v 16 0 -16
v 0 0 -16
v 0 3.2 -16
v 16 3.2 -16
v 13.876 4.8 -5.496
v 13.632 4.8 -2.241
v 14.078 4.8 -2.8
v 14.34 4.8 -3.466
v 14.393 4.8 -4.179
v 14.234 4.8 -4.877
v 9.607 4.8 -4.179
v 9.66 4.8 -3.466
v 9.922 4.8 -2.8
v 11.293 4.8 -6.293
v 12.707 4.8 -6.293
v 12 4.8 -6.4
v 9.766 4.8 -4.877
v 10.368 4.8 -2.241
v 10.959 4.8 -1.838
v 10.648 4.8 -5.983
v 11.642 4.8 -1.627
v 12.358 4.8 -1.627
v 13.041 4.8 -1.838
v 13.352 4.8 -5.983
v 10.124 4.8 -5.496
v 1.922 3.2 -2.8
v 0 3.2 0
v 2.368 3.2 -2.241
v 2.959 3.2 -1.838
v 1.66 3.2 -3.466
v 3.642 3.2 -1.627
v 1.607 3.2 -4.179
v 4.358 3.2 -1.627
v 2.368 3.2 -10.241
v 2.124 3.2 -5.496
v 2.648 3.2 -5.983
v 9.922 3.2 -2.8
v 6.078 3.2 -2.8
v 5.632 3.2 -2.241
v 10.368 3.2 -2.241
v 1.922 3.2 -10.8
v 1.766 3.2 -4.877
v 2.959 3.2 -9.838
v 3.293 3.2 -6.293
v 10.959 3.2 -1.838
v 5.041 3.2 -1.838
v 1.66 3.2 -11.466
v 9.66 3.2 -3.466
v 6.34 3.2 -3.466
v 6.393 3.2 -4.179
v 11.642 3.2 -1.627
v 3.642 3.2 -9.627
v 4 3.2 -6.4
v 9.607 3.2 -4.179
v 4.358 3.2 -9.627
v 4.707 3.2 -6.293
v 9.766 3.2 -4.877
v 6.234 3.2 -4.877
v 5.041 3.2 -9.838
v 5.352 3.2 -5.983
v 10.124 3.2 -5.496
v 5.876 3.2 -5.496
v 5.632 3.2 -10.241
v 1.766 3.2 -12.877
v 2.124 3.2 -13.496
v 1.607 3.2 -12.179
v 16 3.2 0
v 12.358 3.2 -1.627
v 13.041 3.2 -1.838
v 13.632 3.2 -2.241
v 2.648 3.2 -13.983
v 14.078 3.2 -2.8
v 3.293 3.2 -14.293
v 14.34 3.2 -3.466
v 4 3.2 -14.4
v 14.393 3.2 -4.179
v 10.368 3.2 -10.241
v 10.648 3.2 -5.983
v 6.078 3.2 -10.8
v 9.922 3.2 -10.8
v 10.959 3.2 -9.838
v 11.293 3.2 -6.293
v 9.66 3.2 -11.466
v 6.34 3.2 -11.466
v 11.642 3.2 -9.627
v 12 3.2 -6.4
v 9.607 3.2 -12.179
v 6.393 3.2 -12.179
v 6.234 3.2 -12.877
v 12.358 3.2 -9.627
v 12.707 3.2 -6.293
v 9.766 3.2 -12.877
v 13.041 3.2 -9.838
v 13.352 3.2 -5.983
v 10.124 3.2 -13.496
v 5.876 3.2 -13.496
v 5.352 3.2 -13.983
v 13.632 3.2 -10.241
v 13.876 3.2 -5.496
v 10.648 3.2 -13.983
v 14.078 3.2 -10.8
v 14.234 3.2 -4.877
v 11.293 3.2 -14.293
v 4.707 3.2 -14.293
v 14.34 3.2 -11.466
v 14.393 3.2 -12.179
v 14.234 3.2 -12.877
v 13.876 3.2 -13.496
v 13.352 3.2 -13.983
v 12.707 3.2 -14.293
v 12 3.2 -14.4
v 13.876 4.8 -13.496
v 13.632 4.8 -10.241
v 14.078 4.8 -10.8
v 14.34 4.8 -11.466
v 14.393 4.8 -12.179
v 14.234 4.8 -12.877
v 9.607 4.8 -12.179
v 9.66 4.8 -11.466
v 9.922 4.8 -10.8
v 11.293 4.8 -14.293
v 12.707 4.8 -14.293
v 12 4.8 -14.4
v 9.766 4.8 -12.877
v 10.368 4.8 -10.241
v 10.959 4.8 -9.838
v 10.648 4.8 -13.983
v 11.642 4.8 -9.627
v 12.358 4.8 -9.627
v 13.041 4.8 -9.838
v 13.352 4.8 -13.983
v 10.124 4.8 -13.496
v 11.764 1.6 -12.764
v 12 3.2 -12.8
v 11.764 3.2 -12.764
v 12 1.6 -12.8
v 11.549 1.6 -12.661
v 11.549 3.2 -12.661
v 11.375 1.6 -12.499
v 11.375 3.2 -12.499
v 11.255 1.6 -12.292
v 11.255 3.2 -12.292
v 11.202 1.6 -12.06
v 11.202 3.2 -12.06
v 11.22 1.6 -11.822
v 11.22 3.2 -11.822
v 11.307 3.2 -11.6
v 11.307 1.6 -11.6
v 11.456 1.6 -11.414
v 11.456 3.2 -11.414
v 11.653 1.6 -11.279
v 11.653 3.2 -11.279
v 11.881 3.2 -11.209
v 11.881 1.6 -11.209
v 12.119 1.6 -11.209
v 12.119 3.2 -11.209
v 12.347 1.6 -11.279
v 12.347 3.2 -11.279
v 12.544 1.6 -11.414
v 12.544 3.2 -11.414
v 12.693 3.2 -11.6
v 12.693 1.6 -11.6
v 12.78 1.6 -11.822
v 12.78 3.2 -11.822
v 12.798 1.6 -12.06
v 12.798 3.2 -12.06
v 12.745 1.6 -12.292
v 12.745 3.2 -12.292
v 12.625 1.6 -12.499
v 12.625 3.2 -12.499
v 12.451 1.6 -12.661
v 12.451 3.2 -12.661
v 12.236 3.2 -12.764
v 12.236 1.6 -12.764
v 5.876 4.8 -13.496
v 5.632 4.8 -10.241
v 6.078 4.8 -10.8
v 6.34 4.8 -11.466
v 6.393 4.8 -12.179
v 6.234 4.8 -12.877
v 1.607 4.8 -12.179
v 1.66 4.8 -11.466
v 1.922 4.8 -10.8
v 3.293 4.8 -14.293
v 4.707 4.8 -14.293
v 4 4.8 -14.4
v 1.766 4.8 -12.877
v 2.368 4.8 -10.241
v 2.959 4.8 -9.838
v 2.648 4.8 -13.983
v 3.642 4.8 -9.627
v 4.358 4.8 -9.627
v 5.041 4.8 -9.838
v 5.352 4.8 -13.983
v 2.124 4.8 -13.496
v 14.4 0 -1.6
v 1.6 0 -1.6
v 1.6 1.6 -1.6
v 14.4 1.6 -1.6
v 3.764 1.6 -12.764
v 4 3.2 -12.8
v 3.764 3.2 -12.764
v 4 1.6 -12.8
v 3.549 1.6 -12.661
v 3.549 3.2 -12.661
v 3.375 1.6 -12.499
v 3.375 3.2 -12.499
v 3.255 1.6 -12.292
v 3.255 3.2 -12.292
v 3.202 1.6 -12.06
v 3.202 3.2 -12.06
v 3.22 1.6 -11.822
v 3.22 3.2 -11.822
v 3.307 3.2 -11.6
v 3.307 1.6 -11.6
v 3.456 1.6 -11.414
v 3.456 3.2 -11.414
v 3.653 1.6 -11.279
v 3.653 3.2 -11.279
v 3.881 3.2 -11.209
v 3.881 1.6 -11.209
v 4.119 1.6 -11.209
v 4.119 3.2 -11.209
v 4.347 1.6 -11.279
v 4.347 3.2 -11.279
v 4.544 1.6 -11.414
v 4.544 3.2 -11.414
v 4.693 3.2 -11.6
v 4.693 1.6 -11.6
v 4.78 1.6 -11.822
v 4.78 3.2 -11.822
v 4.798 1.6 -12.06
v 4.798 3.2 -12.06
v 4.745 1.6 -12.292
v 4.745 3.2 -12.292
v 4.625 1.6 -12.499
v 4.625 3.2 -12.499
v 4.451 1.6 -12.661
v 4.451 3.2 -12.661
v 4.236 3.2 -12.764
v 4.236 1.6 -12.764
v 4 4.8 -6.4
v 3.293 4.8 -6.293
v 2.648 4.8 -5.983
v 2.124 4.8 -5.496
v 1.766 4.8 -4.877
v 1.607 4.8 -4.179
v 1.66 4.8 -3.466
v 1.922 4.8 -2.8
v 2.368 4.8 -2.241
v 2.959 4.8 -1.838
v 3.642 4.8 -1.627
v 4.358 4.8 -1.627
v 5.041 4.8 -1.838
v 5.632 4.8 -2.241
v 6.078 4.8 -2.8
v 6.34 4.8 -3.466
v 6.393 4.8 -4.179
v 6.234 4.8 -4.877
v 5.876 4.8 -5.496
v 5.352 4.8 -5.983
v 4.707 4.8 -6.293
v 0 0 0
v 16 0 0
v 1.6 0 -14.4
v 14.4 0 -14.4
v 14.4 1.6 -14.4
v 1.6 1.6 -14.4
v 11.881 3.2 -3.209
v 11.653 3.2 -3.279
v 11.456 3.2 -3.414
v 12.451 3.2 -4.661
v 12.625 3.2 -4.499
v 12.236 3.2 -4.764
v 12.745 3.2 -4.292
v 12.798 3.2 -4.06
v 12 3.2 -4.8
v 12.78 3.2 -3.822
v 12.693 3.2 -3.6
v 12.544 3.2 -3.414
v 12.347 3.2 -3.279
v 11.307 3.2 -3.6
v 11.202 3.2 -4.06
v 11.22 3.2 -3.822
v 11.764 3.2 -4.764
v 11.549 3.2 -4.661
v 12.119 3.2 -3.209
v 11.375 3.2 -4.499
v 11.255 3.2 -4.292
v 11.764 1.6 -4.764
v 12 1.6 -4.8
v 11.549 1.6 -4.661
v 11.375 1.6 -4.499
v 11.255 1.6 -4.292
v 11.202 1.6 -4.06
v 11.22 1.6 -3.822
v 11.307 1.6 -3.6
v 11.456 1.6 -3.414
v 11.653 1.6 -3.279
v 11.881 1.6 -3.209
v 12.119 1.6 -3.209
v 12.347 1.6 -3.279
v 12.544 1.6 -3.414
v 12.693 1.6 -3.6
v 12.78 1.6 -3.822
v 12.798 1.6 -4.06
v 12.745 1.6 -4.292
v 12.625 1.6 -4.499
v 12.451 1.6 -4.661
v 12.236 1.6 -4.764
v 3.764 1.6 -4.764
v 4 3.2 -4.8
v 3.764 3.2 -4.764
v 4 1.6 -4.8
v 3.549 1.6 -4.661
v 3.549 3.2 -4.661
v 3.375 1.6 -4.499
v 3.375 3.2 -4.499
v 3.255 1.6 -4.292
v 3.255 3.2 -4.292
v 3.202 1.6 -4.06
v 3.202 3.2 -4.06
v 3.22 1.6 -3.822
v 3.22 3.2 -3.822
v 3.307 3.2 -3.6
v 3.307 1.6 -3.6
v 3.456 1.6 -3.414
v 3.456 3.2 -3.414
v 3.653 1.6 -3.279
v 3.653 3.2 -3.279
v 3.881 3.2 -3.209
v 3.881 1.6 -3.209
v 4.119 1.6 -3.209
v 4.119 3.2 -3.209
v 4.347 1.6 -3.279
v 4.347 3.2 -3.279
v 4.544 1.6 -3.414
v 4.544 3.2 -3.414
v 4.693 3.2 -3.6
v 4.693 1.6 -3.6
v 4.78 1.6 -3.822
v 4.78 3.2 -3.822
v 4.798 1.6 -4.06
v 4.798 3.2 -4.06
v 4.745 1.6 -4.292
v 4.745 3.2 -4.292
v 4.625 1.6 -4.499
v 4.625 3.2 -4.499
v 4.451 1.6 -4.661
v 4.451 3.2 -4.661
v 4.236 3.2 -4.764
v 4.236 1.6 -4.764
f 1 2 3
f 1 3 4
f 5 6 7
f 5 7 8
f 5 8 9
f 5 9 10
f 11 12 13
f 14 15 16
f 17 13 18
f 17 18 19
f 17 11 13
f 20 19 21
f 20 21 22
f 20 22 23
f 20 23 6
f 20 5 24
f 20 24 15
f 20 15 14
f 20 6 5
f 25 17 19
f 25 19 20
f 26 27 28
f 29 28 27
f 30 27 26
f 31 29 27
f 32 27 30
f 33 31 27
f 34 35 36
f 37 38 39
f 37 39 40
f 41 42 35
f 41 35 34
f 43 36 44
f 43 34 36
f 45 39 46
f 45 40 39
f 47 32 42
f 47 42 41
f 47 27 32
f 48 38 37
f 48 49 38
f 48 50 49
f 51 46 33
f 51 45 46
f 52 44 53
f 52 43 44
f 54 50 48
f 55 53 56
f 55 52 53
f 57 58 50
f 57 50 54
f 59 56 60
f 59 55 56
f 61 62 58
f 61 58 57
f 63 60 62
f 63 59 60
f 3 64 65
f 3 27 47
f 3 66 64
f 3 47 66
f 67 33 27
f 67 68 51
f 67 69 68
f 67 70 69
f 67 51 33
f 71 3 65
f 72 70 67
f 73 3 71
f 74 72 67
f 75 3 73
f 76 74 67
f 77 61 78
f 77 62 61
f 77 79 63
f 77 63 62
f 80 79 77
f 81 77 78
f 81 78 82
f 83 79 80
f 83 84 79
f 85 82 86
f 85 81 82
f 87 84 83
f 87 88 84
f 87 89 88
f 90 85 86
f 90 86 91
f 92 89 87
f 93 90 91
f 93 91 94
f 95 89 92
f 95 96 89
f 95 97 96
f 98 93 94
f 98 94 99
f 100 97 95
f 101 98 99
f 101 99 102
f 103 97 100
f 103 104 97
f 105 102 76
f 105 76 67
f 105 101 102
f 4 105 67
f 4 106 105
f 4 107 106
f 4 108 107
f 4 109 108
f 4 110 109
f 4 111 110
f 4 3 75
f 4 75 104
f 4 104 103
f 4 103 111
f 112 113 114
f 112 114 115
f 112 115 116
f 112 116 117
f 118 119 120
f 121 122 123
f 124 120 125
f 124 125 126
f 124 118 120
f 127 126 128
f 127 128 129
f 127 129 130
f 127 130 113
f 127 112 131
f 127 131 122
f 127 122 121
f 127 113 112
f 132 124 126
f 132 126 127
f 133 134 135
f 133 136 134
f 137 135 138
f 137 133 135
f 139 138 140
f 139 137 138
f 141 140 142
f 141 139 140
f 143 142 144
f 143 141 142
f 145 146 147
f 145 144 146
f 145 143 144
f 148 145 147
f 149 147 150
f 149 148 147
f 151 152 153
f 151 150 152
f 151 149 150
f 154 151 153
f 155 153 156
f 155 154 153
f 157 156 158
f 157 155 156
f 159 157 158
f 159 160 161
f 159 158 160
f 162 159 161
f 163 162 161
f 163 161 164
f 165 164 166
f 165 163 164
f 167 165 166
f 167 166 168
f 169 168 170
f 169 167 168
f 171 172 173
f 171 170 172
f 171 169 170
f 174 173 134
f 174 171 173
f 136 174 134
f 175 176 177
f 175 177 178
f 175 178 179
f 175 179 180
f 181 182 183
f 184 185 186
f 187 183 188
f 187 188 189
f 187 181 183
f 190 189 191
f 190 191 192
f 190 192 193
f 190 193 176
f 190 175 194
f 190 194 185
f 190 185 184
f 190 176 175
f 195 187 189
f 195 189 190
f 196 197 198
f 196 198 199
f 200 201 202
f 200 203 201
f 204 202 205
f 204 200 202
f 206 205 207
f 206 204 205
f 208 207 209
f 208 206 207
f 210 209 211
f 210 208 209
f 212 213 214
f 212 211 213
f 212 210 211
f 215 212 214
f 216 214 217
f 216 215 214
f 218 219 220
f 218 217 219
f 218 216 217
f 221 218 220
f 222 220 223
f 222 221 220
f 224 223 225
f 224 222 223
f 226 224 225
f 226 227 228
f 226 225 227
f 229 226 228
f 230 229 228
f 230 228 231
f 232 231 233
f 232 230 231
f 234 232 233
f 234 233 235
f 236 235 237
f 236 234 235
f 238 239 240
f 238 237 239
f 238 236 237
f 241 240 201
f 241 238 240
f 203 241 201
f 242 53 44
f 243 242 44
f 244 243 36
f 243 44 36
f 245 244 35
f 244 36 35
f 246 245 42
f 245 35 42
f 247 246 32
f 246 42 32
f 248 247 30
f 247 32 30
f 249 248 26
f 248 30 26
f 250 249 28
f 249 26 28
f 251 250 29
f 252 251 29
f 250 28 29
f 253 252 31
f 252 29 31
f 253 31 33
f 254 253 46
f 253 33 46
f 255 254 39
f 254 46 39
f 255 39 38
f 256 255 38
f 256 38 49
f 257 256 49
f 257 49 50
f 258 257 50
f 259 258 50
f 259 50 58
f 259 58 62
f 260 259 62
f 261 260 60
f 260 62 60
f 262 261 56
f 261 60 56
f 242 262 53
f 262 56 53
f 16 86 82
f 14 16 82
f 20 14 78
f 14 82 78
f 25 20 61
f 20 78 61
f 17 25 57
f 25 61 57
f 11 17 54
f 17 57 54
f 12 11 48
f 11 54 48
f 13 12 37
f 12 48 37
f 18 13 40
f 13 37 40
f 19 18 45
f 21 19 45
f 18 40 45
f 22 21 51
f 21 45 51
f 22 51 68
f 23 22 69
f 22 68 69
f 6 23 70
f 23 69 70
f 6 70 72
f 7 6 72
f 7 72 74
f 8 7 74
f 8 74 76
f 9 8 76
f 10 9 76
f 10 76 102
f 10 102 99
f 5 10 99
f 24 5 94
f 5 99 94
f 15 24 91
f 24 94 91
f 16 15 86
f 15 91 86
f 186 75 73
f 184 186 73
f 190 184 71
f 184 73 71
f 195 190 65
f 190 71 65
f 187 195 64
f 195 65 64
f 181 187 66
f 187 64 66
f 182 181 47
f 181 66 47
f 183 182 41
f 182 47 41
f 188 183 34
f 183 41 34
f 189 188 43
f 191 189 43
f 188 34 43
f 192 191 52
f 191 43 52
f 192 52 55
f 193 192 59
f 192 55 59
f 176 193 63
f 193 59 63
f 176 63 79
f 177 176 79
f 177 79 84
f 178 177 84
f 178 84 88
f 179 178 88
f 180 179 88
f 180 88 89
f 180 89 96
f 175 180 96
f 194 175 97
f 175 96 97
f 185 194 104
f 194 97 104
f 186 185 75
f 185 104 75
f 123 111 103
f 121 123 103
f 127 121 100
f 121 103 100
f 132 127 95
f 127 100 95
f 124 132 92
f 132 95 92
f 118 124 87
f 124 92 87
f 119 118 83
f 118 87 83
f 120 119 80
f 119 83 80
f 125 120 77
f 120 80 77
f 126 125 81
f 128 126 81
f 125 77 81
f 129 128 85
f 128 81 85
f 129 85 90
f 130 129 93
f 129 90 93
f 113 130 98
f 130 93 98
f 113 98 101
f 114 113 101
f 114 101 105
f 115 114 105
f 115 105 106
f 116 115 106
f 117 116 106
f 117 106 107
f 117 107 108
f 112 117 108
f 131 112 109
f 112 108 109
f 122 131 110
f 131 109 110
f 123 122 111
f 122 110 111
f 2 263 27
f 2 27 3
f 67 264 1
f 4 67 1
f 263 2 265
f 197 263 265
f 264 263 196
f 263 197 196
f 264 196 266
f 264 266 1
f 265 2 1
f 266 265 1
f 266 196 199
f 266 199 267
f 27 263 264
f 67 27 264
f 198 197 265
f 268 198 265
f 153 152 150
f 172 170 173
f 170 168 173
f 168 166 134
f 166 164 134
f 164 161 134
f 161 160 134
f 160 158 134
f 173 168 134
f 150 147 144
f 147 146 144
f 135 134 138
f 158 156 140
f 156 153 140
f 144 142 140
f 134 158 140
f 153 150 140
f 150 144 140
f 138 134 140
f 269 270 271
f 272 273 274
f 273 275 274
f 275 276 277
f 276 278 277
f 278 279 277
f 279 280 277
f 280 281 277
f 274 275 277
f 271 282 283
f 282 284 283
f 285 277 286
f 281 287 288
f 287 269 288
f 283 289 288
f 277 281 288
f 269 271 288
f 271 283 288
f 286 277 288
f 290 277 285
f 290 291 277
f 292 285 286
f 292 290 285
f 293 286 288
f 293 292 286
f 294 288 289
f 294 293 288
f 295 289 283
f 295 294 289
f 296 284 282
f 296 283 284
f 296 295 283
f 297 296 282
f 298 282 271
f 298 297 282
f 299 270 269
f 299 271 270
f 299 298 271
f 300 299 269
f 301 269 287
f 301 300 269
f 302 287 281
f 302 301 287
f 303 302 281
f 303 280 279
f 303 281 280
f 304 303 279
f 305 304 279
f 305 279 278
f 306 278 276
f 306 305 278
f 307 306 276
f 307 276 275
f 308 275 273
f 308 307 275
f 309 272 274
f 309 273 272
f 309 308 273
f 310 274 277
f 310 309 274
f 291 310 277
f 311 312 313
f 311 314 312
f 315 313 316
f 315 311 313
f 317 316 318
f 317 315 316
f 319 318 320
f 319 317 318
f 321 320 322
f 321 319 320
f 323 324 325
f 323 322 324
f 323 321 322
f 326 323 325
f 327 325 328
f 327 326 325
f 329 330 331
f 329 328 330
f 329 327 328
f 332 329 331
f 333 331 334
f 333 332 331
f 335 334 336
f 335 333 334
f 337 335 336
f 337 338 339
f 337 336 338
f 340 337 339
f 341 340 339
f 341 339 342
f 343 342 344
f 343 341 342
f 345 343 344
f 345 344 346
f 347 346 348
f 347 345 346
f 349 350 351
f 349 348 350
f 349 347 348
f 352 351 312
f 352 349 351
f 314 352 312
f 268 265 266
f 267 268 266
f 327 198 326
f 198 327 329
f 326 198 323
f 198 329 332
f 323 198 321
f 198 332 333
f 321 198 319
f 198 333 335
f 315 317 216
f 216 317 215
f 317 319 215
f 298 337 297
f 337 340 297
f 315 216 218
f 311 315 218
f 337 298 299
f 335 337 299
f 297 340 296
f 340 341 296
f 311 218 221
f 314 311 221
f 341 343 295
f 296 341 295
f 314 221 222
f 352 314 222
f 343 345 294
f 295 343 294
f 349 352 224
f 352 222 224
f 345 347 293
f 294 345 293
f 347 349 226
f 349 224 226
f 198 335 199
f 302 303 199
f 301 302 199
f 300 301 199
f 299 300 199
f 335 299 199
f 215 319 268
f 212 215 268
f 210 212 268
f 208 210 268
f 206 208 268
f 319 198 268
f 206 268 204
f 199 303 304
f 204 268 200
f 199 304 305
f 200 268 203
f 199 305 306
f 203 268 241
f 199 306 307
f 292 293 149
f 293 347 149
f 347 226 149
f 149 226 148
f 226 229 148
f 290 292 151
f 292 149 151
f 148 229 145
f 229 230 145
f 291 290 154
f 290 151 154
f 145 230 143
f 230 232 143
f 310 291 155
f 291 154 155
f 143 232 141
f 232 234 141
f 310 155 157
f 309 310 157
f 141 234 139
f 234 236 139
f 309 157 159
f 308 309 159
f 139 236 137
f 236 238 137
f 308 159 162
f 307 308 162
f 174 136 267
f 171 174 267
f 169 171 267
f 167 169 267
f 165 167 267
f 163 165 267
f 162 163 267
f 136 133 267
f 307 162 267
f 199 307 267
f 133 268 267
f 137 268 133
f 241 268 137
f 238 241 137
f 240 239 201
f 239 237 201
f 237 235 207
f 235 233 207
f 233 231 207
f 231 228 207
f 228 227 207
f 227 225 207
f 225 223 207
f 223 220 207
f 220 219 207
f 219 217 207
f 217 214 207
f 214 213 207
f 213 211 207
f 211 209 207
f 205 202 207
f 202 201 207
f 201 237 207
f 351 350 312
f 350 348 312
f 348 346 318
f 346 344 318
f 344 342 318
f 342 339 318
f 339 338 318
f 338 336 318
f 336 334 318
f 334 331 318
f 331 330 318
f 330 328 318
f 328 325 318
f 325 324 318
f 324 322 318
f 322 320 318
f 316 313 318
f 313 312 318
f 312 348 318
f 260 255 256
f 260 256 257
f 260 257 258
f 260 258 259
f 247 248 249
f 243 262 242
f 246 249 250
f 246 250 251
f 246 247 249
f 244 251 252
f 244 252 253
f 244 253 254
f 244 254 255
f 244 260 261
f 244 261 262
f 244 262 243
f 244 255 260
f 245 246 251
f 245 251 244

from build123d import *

# Parameters (mm, degrees)
SKETCH1_W            = 16
SKETCH1_H            = 16
BOSS_EXTRUDE1_DEPTH  = 3.2
SKETCH2_R            = 2.4
BOSS_EXTRUDE2_DEPTH  = 1.6
LPATTERN1_COUNT      = 2
LPATTERN1_PITCH      = 8
LPATTERN1_COUNT_DIR2 = 4
LPATTERN1_PITCH_DIR2 = 8
SHELL1_T             = -1.6


with BuildPart() as part:
    # Sketch1 → Boss-Extrude1 (new body)
    with BuildSketch(Plane(origin=(0, 0, 0), x_dir=(1, 0, 0), z_dir=(0, 1, 0))):
        with Locations((8, 8)):
            Rectangle(SKETCH1_W, SKETCH1_H)
    extrude(amount=BOSS_EXTRUDE1_DEPTH)

    # Sketch2 → Boss-Extrude2 (add)
    with BuildSketch(Plane(origin=(0, 3.2, 0), x_dir=(1, 0, 0), z_dir=(0, 1, 0))):
        with Locations(Location((12, 4, 0), (0, 0, 90))):
            Circle(SKETCH2_R)
    boss_extrude2 = extrude(amount=BOSS_EXTRUDE2_DEPTH)

    # LPattern1: Boss-Extrude2 2 × 4, 4 skipped
    with Locations(*[(-i * LPATTERN1_PITCH, 0, -j * LPATTERN1_PITCH_DIR2) for i in range(LPATTERN1_COUNT) for j in range(LPATTERN1_COUNT_DIR2) if (i, j) not in ((0, 0), (0, 2), (0, 3), (1, 2), (1, 3))]):
        add(boss_extrude2)

    # Shell1
    shell1_openings = [part.faces().sort_by_distance(p)[0] for p in [
        (8, 0, -8),
    ]]
    offset(amount=SHELL1_T, openings=shell1_openings, kind=Kind.INTERSECTION)


solid = part.part
